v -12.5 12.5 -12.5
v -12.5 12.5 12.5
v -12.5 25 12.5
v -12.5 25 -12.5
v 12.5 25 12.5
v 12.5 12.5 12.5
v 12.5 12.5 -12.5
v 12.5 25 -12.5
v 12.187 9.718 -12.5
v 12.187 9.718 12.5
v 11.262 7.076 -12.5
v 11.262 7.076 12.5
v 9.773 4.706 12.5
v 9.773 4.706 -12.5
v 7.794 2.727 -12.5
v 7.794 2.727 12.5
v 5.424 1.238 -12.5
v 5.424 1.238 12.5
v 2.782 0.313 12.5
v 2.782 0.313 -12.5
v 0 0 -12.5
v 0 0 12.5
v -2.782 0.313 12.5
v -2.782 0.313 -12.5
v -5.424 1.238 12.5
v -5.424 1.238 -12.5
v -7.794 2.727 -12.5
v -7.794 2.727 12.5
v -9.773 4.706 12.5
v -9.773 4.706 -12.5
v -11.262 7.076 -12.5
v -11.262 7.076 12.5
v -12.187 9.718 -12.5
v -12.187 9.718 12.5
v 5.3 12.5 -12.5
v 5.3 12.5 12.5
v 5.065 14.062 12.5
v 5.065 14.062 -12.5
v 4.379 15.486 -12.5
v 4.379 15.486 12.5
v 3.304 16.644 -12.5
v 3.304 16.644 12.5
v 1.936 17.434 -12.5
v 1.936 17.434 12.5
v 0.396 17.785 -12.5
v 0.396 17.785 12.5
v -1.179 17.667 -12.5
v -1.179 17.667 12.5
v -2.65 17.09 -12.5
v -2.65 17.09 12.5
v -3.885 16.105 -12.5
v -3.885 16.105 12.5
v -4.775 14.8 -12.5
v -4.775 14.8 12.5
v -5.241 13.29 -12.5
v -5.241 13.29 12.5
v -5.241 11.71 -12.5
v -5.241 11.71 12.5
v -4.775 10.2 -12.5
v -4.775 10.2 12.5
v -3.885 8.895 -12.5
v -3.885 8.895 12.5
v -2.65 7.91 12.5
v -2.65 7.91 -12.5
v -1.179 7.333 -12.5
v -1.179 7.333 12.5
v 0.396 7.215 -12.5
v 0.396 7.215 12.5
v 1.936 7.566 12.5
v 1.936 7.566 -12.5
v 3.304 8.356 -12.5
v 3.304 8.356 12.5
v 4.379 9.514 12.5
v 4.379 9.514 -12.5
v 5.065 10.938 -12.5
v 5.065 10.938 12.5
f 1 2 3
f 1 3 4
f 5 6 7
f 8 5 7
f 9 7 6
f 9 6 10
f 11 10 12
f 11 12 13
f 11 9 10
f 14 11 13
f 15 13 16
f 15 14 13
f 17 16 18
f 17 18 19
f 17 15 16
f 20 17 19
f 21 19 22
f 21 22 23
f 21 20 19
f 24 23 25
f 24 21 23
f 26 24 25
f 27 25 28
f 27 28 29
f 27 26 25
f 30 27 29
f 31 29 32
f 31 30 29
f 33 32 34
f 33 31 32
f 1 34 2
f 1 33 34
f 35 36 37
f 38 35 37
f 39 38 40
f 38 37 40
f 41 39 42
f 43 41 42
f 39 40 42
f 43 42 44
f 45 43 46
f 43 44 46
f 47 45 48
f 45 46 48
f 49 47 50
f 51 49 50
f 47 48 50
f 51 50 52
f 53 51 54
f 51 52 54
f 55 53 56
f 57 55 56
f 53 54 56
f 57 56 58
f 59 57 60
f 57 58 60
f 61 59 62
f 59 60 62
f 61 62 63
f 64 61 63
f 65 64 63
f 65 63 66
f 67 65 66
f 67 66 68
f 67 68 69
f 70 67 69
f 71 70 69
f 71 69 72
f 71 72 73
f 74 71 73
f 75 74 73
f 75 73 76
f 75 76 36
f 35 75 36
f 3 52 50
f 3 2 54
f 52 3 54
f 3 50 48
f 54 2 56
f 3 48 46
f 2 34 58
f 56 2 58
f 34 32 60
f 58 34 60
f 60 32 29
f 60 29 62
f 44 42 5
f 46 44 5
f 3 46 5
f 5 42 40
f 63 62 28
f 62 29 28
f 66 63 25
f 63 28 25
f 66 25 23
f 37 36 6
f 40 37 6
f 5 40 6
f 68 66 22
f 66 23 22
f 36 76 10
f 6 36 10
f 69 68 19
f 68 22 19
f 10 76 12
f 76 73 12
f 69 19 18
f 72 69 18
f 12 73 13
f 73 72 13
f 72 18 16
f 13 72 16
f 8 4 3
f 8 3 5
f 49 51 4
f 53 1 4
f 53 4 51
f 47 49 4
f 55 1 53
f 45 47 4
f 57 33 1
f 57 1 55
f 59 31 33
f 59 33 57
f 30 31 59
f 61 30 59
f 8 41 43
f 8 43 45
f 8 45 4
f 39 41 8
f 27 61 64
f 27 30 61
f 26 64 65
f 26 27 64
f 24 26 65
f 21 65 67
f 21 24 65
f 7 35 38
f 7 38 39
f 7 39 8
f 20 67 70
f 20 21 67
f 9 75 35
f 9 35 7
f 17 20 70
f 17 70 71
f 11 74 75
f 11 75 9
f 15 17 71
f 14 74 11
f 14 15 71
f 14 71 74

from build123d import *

# Parameters (mm, degrees)
SKETCH1_W           = 25
SKETCH1_H           = 25
BOSS_EXTRUDE1_DEPTH = 25
SKETCH2_R           = 5.3
CUT_EXTRUDE1_DEPTH  = 38.5
FILLET1_RADIUS      = 12.5
FILLET1_LENGTH      = 25


with BuildPart() as part:
    # Sketch1 → Boss-Extrude1 (new body)
    with BuildSketch(Plane(origin=(0, 0, 0), x_dir=(1, 0, 0), z_dir=(0, 1, 0))):
        Rectangle(SKETCH1_W, SKETCH1_H)
    extrude(amount=BOSS_EXTRUDE1_DEPTH)

    # Sketch2 → Cut-Extrude1 (cut, through all)
    with BuildSketch(Plane.XY.offset(12.5)):
        with Locations((0, 12.5)):
            Circle(SKETCH2_R)
    extrude(amount=-CUT_EXTRUDE1_DEPTH, mode=Mode.SUBTRACT)

    # Fillet1: full round fillet: the end face becomes a half cylinder, R = half its width
    fillet1_face = Plane((0, 0, 0), x_dir=(0, 0, -1), z_dir=(0, -1, 0))  # on the end face: x along it, z out of the body
    fillet1_slab = fillet1_face.offset(-FILLET1_RADIUS / 2) * Box(FILLET1_LENGTH, 2 * FILLET1_RADIUS, FILLET1_RADIUS, mode=Mode.PRIVATE)  # the body's end, R deep
    fillet1_round = Plane((0, 12.5, 0), x_dir=(0, -1, 0), z_dir=(0, 0, -1)) * Cylinder(FILLET1_RADIUS, FILLET1_LENGTH, mode=Mode.PRIVATE)  # its axis R under the face
    add(fillet1_slab - fillet1_round, mode=Mode.SUBTRACT)


solid = part.part
